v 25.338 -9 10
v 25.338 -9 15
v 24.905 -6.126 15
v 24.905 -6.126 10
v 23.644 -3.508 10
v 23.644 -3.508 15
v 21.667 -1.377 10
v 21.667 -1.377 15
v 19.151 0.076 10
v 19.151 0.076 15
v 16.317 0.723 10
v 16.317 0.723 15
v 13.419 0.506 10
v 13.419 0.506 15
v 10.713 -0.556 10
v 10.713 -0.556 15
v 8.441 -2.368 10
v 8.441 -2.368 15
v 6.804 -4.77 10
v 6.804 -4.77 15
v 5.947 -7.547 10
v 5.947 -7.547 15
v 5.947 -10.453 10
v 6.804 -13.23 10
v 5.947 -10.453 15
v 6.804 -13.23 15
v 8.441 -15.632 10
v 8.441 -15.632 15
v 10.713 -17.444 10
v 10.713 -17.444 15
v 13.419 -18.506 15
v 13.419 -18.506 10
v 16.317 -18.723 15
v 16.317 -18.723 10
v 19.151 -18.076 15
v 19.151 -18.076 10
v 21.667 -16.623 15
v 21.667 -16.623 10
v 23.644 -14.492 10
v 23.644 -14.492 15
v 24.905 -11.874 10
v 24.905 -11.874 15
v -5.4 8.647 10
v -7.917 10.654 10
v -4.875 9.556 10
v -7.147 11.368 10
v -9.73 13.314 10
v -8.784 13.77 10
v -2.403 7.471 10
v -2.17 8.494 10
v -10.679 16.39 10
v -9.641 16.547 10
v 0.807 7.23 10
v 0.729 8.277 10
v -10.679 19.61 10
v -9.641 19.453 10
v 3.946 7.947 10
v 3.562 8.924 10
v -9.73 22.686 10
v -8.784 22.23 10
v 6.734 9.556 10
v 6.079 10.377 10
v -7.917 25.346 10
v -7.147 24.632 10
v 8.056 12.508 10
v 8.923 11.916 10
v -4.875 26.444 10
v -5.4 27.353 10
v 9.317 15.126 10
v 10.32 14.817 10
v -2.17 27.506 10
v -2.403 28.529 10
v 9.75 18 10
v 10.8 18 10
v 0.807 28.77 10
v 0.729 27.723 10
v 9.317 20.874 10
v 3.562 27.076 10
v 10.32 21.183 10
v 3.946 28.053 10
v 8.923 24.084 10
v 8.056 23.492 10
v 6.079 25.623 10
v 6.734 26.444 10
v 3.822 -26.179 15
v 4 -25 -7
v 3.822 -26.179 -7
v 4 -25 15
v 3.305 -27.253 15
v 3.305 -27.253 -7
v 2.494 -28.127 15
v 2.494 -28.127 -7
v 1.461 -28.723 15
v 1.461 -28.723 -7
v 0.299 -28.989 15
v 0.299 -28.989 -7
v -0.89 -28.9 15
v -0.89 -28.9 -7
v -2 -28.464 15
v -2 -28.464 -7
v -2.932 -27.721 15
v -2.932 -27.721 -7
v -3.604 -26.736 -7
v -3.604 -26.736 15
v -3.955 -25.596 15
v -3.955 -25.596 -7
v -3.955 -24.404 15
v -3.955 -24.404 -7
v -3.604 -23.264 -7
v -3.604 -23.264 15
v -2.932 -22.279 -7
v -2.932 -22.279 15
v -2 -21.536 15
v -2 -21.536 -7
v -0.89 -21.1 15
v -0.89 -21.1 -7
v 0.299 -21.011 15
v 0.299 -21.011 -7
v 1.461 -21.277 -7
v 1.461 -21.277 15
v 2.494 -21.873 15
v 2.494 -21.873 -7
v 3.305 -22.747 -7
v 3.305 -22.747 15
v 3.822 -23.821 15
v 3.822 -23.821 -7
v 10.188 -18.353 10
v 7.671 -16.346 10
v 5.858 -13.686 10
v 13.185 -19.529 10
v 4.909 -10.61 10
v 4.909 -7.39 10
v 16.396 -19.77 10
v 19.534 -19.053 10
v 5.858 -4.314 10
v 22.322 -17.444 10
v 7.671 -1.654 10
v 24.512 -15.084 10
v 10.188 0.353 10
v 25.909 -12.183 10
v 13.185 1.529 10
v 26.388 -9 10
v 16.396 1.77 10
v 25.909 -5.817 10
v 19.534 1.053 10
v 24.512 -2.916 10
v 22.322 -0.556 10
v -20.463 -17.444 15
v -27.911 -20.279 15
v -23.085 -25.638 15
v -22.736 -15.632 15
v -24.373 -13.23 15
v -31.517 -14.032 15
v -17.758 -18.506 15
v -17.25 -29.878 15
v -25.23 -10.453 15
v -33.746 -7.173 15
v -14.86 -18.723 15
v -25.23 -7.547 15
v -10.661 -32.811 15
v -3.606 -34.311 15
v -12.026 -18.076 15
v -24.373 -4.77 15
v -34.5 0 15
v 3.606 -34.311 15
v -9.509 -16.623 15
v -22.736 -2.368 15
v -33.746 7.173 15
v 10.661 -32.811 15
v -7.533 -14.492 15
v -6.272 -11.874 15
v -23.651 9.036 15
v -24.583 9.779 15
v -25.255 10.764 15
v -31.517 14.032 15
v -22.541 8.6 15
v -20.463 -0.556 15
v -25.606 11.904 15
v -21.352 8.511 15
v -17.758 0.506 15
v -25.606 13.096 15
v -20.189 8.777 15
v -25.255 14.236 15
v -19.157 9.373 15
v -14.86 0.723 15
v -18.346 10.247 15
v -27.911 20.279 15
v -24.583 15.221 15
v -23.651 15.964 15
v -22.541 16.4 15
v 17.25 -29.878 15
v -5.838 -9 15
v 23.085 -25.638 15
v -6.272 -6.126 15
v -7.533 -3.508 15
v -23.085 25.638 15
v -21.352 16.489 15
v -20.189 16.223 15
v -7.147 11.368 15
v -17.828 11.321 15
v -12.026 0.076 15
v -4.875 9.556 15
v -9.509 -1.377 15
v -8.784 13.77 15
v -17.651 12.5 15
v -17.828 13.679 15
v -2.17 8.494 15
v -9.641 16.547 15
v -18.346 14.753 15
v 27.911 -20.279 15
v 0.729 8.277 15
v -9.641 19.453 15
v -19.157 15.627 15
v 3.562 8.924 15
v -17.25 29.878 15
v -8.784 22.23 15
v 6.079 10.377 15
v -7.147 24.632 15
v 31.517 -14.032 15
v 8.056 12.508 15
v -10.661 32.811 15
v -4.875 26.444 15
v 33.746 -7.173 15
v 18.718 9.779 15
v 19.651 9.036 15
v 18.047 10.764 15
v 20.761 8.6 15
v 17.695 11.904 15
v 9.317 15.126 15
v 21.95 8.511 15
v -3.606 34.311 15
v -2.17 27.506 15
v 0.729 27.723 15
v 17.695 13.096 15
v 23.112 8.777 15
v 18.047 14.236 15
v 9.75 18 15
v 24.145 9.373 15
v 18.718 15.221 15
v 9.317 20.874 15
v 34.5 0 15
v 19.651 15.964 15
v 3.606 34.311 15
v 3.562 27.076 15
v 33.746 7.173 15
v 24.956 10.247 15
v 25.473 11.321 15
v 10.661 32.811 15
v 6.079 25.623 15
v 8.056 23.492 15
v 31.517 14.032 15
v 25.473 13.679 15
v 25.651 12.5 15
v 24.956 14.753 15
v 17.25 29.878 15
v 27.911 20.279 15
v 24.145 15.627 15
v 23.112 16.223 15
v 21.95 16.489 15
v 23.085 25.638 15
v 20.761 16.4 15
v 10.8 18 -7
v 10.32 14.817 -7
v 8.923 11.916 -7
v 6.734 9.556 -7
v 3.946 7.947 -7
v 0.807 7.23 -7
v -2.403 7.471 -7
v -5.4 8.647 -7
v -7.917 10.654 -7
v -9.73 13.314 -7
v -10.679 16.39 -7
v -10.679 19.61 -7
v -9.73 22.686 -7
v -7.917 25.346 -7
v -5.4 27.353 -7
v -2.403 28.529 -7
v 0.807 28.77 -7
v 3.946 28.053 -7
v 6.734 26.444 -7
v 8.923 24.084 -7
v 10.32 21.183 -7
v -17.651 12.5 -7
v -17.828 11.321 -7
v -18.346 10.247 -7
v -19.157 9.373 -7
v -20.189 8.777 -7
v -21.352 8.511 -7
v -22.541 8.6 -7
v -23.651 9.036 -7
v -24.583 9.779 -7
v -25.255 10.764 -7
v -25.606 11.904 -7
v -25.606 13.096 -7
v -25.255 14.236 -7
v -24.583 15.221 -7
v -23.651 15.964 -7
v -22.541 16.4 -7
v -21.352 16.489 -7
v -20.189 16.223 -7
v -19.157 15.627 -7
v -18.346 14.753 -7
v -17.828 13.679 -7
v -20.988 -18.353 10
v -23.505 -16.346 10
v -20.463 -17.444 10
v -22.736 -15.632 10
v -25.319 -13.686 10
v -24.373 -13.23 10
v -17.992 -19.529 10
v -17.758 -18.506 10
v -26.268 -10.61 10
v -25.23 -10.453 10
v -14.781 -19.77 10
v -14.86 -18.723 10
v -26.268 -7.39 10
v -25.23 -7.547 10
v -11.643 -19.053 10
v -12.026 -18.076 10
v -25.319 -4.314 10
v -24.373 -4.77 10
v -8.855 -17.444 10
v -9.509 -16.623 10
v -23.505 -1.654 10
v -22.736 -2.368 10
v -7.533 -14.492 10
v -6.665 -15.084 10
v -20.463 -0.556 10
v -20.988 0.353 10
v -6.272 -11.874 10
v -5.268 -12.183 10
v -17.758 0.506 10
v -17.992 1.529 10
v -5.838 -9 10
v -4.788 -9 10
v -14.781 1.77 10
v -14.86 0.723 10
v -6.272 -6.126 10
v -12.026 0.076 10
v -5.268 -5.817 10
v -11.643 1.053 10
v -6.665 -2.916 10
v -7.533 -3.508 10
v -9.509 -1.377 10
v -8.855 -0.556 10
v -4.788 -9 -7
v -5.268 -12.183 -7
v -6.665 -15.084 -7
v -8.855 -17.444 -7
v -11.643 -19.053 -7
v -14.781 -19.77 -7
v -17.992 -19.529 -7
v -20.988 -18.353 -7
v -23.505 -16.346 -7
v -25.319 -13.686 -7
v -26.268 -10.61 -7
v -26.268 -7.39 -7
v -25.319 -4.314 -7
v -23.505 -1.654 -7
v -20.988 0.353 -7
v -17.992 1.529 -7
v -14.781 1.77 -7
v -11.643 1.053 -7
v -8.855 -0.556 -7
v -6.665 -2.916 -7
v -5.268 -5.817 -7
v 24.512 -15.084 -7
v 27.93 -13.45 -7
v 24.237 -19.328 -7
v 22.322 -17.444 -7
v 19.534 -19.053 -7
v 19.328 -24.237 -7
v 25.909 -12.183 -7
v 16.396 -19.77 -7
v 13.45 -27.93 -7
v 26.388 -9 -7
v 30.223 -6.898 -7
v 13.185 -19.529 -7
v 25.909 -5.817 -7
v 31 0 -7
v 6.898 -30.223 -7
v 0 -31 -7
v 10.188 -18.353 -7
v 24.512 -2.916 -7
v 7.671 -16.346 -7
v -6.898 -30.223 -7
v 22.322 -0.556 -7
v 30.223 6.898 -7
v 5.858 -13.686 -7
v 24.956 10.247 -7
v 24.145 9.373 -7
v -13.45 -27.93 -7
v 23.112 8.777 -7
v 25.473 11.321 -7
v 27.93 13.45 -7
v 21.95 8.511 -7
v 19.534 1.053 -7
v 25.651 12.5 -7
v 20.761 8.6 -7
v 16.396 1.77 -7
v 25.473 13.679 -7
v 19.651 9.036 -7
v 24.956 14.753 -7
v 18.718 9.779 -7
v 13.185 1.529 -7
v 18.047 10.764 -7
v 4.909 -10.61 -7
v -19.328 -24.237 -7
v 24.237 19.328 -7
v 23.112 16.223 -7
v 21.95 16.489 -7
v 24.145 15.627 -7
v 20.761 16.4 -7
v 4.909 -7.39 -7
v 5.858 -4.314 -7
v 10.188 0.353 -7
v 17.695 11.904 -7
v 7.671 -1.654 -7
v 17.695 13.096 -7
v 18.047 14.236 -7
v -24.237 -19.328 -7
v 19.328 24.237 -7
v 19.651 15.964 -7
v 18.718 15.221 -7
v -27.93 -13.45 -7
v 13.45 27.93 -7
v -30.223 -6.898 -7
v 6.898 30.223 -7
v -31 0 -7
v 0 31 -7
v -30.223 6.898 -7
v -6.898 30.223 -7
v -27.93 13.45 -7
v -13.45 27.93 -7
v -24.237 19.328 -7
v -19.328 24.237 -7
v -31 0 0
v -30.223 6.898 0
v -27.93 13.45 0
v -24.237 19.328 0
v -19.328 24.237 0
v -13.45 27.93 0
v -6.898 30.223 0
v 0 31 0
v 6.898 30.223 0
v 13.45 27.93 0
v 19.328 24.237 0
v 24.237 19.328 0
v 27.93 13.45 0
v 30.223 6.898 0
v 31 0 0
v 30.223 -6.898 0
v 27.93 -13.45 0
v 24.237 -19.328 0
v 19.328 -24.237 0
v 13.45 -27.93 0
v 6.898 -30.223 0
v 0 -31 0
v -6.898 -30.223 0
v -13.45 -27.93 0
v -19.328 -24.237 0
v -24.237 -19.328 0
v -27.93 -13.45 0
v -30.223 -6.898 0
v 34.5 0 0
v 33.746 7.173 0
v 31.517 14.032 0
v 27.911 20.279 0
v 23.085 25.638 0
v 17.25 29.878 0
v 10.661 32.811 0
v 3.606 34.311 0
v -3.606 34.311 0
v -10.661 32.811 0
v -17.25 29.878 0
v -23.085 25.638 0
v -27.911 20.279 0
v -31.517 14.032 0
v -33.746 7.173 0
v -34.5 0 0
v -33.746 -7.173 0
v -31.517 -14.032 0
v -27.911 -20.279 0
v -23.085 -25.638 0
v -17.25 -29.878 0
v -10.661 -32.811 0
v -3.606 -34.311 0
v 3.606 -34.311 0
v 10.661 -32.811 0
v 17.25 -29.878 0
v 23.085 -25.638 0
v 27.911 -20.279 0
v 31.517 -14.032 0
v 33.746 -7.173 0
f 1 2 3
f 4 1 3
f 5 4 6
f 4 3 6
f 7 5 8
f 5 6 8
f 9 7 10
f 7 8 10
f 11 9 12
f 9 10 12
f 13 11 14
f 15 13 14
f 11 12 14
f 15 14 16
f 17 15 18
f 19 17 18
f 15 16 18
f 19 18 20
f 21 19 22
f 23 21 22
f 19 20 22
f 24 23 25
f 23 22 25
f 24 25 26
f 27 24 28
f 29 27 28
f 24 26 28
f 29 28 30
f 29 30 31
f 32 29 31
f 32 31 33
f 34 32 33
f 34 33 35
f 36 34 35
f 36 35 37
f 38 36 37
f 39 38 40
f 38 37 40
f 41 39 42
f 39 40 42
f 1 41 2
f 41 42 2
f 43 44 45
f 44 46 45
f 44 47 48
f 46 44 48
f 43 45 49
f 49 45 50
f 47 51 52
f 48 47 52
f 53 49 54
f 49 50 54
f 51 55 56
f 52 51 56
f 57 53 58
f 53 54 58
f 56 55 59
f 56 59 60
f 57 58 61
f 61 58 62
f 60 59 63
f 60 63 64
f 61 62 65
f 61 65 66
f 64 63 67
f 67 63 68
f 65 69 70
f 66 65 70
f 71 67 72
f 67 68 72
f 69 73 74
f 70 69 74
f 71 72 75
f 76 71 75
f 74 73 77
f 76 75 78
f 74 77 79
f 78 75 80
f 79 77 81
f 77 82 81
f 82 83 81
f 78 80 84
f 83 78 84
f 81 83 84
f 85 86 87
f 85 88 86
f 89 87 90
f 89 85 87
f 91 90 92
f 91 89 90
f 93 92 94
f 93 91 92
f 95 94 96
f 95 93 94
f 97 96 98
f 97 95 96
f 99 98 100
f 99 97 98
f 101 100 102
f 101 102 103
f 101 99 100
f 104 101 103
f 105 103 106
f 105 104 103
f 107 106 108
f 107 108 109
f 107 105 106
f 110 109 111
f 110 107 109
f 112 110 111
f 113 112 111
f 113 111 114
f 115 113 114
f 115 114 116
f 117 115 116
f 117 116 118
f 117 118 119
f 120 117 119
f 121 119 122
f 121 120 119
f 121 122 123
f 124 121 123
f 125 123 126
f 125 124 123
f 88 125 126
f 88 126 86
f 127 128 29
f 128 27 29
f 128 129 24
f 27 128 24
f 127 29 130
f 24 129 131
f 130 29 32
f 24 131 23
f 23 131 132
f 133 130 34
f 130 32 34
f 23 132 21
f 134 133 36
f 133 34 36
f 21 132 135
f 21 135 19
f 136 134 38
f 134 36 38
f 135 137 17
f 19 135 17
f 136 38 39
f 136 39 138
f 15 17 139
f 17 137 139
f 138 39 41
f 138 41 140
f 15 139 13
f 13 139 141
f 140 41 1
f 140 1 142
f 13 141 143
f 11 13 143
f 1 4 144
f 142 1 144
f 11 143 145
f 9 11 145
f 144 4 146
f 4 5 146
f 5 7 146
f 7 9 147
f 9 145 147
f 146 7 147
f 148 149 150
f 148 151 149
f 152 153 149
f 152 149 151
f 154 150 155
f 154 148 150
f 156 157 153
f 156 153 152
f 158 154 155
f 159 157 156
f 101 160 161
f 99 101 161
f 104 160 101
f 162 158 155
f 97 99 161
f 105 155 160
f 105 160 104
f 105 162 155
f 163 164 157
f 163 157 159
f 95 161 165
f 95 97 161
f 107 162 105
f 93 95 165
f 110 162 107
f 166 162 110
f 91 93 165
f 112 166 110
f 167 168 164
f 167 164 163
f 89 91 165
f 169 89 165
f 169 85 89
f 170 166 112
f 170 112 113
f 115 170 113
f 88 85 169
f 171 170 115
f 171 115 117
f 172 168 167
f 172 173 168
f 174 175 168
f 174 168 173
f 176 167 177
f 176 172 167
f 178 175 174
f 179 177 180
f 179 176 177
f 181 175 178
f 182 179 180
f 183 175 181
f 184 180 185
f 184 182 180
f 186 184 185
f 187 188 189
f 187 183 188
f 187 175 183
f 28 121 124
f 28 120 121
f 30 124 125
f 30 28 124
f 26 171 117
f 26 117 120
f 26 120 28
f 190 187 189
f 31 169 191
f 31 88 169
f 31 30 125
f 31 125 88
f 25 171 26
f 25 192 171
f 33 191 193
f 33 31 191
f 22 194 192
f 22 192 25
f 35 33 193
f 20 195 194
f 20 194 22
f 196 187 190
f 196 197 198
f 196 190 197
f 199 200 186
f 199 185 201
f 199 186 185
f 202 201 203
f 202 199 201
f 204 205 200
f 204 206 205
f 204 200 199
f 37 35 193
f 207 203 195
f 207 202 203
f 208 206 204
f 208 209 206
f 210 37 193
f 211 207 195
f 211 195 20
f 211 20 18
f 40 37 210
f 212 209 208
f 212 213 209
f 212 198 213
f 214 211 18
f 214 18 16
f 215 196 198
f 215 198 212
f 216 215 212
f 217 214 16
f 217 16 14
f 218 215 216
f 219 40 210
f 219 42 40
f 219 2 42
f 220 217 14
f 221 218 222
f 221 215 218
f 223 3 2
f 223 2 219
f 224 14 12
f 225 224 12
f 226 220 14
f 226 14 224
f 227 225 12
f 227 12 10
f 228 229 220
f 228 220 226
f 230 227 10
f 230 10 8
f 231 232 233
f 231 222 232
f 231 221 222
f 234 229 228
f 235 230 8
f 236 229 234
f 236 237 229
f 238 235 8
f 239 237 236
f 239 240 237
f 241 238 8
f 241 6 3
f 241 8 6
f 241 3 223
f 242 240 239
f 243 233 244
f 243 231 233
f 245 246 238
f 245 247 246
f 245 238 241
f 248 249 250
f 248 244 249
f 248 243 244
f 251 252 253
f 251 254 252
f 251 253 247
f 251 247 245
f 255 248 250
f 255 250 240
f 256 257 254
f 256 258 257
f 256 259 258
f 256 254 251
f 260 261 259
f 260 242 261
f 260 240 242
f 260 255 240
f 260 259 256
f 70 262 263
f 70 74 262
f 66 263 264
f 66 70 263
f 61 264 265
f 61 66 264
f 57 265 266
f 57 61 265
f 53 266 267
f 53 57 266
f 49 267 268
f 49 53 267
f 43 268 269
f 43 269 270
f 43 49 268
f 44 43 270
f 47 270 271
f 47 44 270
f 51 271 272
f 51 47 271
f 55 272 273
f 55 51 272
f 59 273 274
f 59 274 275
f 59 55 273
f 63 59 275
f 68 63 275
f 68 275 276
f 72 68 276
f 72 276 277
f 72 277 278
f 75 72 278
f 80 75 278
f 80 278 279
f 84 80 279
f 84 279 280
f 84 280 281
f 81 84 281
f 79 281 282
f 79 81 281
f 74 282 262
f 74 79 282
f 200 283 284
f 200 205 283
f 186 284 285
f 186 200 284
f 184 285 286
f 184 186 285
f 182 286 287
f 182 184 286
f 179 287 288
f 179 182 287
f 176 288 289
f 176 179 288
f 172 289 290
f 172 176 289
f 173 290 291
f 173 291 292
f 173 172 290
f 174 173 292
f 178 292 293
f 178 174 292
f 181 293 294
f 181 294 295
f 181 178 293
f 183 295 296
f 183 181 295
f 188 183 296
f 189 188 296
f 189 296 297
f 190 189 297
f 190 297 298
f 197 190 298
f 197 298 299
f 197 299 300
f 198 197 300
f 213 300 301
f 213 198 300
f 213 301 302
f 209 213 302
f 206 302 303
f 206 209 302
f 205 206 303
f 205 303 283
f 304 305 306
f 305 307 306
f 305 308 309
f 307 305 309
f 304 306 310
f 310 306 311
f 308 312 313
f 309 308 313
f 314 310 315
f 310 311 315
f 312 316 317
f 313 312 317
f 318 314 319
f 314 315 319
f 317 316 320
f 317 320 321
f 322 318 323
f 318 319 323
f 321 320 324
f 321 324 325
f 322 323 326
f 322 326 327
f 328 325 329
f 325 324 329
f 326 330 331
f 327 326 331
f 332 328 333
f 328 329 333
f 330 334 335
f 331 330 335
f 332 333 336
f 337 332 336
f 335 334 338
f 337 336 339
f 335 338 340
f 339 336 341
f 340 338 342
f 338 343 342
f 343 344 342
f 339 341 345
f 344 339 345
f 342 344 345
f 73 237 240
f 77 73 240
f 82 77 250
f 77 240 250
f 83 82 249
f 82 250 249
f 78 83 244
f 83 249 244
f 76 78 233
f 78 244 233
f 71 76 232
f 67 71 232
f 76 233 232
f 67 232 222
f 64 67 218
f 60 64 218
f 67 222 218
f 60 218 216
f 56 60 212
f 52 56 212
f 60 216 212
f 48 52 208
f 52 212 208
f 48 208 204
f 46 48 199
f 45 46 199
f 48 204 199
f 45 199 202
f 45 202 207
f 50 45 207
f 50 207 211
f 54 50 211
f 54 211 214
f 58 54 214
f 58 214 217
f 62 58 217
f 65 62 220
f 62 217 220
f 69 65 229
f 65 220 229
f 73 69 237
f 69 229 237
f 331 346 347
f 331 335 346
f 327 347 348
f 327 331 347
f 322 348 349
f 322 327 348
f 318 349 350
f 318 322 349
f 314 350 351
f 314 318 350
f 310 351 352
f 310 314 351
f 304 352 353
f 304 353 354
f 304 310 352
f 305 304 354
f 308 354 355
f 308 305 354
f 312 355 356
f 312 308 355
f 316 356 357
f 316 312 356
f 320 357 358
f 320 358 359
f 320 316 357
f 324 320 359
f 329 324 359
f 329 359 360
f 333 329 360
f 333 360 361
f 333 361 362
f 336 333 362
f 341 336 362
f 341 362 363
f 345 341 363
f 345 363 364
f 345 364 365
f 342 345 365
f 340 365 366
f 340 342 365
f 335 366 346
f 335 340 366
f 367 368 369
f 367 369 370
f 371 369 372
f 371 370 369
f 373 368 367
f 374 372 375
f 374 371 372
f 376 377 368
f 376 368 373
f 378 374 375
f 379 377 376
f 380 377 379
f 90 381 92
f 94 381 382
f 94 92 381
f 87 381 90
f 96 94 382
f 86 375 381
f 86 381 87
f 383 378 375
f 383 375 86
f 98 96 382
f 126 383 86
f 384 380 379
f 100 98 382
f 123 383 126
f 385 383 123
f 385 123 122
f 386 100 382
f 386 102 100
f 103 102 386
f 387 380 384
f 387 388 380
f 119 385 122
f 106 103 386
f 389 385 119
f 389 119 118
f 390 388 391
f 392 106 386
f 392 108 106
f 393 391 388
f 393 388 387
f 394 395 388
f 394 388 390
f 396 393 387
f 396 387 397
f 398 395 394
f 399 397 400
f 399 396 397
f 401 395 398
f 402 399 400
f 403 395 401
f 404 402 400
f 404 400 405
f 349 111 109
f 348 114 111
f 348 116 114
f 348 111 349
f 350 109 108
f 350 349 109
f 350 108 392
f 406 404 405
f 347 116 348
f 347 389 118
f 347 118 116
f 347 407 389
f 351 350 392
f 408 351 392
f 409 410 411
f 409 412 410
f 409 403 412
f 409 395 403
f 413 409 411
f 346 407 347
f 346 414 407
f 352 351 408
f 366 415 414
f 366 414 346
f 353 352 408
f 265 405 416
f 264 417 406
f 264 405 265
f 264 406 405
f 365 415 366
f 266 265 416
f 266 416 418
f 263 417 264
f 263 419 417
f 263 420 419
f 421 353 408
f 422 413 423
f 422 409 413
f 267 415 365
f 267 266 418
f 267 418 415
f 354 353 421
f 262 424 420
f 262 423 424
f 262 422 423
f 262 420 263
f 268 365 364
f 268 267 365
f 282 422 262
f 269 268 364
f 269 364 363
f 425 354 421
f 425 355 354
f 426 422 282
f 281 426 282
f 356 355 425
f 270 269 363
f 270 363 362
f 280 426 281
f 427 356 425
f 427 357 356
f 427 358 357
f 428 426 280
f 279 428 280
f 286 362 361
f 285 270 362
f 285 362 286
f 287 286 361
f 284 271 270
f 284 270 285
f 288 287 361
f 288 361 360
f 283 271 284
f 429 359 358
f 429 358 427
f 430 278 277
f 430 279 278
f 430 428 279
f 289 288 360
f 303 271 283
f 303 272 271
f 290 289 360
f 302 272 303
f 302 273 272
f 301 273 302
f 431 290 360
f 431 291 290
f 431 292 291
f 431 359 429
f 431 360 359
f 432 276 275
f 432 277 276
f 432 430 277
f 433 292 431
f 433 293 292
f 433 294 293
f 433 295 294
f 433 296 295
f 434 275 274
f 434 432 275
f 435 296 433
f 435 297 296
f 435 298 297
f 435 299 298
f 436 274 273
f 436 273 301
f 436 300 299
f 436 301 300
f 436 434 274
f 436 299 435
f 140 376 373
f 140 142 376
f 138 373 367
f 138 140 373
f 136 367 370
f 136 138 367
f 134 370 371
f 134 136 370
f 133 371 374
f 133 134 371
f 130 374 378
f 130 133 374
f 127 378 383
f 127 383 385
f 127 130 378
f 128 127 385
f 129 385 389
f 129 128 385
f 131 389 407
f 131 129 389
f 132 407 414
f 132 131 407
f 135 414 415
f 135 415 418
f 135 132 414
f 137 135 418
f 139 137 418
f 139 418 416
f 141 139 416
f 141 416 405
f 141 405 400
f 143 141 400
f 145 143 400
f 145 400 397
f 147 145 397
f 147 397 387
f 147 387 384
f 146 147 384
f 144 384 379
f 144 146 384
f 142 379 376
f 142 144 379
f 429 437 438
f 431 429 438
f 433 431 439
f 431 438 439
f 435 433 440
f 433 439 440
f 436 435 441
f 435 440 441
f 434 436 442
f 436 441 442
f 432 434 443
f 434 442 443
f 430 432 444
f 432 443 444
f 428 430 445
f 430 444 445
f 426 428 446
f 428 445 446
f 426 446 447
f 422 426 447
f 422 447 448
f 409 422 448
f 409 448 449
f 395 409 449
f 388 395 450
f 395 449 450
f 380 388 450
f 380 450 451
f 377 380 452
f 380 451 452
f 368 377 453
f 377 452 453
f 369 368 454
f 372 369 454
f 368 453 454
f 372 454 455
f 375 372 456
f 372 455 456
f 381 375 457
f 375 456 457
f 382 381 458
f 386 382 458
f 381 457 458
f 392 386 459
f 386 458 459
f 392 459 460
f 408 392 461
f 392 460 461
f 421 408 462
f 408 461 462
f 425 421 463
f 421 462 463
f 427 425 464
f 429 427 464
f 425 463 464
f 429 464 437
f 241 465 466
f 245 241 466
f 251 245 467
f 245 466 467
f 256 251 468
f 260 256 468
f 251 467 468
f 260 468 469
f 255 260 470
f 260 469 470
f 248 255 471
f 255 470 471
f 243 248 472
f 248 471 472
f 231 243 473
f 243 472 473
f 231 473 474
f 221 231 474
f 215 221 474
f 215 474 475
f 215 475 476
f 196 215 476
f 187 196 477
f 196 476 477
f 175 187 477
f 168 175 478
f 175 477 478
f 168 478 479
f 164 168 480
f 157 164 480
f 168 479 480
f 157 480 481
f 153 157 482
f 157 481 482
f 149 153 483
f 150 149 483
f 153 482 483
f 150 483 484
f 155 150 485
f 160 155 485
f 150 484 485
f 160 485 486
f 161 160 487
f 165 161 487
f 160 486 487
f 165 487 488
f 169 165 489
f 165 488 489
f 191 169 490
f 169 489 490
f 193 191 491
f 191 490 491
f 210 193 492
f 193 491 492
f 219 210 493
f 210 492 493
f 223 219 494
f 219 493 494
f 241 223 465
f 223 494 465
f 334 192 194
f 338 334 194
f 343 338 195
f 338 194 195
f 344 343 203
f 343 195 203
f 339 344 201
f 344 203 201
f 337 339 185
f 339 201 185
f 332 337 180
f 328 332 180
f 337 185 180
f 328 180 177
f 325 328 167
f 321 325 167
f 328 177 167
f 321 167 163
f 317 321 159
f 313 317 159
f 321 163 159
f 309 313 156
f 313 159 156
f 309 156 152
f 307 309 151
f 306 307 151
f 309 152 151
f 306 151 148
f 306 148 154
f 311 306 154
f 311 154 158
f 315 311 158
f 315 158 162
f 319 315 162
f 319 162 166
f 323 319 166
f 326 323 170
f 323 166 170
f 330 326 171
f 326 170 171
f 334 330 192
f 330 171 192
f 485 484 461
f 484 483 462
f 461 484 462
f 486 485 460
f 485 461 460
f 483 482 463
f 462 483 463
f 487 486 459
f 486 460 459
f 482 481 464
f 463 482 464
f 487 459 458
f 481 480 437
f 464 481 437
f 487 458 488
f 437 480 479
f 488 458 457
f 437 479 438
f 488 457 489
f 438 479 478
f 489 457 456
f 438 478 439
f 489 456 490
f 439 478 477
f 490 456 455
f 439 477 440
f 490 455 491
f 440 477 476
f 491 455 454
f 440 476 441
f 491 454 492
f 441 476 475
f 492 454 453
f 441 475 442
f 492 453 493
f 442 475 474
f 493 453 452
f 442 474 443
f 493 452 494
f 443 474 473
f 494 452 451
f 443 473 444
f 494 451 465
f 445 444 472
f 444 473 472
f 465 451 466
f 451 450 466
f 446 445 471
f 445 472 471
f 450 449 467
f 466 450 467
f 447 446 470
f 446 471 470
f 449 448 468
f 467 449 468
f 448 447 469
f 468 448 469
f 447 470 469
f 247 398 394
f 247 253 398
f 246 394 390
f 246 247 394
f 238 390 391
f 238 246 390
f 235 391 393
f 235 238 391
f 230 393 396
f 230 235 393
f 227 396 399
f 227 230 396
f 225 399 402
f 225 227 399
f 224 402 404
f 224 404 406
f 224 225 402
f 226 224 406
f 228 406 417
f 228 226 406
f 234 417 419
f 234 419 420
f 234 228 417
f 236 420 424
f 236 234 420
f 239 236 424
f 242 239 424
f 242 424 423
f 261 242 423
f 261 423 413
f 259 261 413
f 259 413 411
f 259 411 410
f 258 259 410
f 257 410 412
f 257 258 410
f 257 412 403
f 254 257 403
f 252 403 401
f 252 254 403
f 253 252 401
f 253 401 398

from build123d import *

# Parameters (mm, degrees)
ESQUISSE1_R             = 34.5
BOSS_EXTRU_1_DEPTH      = 15
ESQUISSE2_R             = 10.8
ENL_V_MAT_EXTRU_1_DEPTH = 15
ESQUISSE3_R             = 11
ESQUISSE3_R_2           = 9.75
BOSS_EXTRU_2_DEPTH      = 5
ESQUISSE4_R             = 4
ENL_V_MAT_EXTRU_2_DEPTH = 52.044098582
ESQUISSE6_R             = 31
ESQUISSE6_R_2           = 4
ESQUISSE6_R_3           = 10.8
BOSS_EXTRU_5_DEPTH      = 7


with BuildPart() as part:
    # Esquisse1 → Boss.-Extru.1 (new body)
    with BuildSketch(Plane.XY):
        Circle(ESQUISSE1_R)
    extrude(amount=BOSS_EXTRU_1_DEPTH)

    # Esquisse2 → Enlèv. mat.-Extru.1 (cut)
    with BuildSketch(Plane.XY.offset(15)):
        with Locations((0, 18)):
            Circle(ESQUISSE2_R)
        with Locations((15.588457268, -9)):
            Circle(ESQUISSE2_R)
        with Locations((-15.588457268, -9)):
            Circle(ESQUISSE2_R)
    extrude(amount=-ENL_V_MAT_EXTRU_1_DEPTH, mode=Mode.SUBTRACT)

    # Esquisse3 → Boss.-Extru.2 (add)
    # profile 1 of 3: a face of its own
    with BuildSketch(Plane.XY.offset(15)):
        with Locations((0, 18)):
            Circle(ESQUISSE3_R)
        with Locations((0, 18)):
            Circle(ESQUISSE3_R_2, mode=Mode.SUBTRACT)
    # profile 2 of 3: a face of its own
    with BuildSketch(Plane.XY.offset(15)):
        with Locations((15.588457268, -9)):
            Circle(ESQUISSE3_R)
        with Locations((15.588457268, -9)):
            Circle(ESQUISSE3_R_2, mode=Mode.SUBTRACT)
    # profile 3 of 3: a face of its own
    with BuildSketch(Plane.XY.offset(15)):
        with Locations((-15.588457268, -9)):
            Circle(ESQUISSE3_R)
        with Locations((-15.588457268, -9)):
            Circle(ESQUISSE3_R_2, mode=Mode.SUBTRACT)
    extrude(amount=-BOSS_EXTRU_2_DEPTH)

    # Esquisse4 → Enlèv. mat.-Extru.2 (cut, through all)
    with BuildSketch(Plane.XY.offset(15)):
        with Locations((21.650635095, 12.5)):
            Circle(ESQUISSE4_R)
        with Locations((-21.650635095, 12.5)):
            Circle(ESQUISSE4_R)
        with Locations((0, -25)):
            Circle(ESQUISSE4_R)
    extrude(amount=-ENL_V_MAT_EXTRU_2_DEPTH, mode=Mode.SUBTRACT)

    # Esquisse6 → Boss.-Extru.5 (add)
    with BuildSketch(Plane(origin=(0, 0, 0), x_dir=(-1, 0, 0), z_dir=(0, 0, -1))):
        Circle(ESQUISSE6_R)
        with Locations(Location((0, -25, 0), (0, 0, 180))):
            Circle(ESQUISSE6_R_2, mode=Mode.SUBTRACT)
        with Locations(Location((-15.588457268, -9, 0), (0, 0, 180))):
            Circle(ESQUISSE6_R_3, mode=Mode.SUBTRACT)
        with Locations(Location((0, 18, 0), (0, 0, 180))):
            Circle(ESQUISSE6_R_3, mode=Mode.SUBTRACT)
        with Locations(Location((15.588457268, -9, 0), (0, 0, 180))):
            Circle(ESQUISSE6_R_3, mode=Mode.SUBTRACT)
        with Locations(Location((21.650635095, 12.5, 0), (0, 0, 180))):
            Circle(ESQUISSE6_R_2, mode=Mode.SUBTRACT)
        with Locations(Location((-21.650635095, 12.5, 0), (0, 0, 180))):
            Circle(ESQUISSE6_R_2, mode=Mode.SUBTRACT)
    extrude(amount=BOSS_EXTRU_5_DEPTH)


solid = part.part
